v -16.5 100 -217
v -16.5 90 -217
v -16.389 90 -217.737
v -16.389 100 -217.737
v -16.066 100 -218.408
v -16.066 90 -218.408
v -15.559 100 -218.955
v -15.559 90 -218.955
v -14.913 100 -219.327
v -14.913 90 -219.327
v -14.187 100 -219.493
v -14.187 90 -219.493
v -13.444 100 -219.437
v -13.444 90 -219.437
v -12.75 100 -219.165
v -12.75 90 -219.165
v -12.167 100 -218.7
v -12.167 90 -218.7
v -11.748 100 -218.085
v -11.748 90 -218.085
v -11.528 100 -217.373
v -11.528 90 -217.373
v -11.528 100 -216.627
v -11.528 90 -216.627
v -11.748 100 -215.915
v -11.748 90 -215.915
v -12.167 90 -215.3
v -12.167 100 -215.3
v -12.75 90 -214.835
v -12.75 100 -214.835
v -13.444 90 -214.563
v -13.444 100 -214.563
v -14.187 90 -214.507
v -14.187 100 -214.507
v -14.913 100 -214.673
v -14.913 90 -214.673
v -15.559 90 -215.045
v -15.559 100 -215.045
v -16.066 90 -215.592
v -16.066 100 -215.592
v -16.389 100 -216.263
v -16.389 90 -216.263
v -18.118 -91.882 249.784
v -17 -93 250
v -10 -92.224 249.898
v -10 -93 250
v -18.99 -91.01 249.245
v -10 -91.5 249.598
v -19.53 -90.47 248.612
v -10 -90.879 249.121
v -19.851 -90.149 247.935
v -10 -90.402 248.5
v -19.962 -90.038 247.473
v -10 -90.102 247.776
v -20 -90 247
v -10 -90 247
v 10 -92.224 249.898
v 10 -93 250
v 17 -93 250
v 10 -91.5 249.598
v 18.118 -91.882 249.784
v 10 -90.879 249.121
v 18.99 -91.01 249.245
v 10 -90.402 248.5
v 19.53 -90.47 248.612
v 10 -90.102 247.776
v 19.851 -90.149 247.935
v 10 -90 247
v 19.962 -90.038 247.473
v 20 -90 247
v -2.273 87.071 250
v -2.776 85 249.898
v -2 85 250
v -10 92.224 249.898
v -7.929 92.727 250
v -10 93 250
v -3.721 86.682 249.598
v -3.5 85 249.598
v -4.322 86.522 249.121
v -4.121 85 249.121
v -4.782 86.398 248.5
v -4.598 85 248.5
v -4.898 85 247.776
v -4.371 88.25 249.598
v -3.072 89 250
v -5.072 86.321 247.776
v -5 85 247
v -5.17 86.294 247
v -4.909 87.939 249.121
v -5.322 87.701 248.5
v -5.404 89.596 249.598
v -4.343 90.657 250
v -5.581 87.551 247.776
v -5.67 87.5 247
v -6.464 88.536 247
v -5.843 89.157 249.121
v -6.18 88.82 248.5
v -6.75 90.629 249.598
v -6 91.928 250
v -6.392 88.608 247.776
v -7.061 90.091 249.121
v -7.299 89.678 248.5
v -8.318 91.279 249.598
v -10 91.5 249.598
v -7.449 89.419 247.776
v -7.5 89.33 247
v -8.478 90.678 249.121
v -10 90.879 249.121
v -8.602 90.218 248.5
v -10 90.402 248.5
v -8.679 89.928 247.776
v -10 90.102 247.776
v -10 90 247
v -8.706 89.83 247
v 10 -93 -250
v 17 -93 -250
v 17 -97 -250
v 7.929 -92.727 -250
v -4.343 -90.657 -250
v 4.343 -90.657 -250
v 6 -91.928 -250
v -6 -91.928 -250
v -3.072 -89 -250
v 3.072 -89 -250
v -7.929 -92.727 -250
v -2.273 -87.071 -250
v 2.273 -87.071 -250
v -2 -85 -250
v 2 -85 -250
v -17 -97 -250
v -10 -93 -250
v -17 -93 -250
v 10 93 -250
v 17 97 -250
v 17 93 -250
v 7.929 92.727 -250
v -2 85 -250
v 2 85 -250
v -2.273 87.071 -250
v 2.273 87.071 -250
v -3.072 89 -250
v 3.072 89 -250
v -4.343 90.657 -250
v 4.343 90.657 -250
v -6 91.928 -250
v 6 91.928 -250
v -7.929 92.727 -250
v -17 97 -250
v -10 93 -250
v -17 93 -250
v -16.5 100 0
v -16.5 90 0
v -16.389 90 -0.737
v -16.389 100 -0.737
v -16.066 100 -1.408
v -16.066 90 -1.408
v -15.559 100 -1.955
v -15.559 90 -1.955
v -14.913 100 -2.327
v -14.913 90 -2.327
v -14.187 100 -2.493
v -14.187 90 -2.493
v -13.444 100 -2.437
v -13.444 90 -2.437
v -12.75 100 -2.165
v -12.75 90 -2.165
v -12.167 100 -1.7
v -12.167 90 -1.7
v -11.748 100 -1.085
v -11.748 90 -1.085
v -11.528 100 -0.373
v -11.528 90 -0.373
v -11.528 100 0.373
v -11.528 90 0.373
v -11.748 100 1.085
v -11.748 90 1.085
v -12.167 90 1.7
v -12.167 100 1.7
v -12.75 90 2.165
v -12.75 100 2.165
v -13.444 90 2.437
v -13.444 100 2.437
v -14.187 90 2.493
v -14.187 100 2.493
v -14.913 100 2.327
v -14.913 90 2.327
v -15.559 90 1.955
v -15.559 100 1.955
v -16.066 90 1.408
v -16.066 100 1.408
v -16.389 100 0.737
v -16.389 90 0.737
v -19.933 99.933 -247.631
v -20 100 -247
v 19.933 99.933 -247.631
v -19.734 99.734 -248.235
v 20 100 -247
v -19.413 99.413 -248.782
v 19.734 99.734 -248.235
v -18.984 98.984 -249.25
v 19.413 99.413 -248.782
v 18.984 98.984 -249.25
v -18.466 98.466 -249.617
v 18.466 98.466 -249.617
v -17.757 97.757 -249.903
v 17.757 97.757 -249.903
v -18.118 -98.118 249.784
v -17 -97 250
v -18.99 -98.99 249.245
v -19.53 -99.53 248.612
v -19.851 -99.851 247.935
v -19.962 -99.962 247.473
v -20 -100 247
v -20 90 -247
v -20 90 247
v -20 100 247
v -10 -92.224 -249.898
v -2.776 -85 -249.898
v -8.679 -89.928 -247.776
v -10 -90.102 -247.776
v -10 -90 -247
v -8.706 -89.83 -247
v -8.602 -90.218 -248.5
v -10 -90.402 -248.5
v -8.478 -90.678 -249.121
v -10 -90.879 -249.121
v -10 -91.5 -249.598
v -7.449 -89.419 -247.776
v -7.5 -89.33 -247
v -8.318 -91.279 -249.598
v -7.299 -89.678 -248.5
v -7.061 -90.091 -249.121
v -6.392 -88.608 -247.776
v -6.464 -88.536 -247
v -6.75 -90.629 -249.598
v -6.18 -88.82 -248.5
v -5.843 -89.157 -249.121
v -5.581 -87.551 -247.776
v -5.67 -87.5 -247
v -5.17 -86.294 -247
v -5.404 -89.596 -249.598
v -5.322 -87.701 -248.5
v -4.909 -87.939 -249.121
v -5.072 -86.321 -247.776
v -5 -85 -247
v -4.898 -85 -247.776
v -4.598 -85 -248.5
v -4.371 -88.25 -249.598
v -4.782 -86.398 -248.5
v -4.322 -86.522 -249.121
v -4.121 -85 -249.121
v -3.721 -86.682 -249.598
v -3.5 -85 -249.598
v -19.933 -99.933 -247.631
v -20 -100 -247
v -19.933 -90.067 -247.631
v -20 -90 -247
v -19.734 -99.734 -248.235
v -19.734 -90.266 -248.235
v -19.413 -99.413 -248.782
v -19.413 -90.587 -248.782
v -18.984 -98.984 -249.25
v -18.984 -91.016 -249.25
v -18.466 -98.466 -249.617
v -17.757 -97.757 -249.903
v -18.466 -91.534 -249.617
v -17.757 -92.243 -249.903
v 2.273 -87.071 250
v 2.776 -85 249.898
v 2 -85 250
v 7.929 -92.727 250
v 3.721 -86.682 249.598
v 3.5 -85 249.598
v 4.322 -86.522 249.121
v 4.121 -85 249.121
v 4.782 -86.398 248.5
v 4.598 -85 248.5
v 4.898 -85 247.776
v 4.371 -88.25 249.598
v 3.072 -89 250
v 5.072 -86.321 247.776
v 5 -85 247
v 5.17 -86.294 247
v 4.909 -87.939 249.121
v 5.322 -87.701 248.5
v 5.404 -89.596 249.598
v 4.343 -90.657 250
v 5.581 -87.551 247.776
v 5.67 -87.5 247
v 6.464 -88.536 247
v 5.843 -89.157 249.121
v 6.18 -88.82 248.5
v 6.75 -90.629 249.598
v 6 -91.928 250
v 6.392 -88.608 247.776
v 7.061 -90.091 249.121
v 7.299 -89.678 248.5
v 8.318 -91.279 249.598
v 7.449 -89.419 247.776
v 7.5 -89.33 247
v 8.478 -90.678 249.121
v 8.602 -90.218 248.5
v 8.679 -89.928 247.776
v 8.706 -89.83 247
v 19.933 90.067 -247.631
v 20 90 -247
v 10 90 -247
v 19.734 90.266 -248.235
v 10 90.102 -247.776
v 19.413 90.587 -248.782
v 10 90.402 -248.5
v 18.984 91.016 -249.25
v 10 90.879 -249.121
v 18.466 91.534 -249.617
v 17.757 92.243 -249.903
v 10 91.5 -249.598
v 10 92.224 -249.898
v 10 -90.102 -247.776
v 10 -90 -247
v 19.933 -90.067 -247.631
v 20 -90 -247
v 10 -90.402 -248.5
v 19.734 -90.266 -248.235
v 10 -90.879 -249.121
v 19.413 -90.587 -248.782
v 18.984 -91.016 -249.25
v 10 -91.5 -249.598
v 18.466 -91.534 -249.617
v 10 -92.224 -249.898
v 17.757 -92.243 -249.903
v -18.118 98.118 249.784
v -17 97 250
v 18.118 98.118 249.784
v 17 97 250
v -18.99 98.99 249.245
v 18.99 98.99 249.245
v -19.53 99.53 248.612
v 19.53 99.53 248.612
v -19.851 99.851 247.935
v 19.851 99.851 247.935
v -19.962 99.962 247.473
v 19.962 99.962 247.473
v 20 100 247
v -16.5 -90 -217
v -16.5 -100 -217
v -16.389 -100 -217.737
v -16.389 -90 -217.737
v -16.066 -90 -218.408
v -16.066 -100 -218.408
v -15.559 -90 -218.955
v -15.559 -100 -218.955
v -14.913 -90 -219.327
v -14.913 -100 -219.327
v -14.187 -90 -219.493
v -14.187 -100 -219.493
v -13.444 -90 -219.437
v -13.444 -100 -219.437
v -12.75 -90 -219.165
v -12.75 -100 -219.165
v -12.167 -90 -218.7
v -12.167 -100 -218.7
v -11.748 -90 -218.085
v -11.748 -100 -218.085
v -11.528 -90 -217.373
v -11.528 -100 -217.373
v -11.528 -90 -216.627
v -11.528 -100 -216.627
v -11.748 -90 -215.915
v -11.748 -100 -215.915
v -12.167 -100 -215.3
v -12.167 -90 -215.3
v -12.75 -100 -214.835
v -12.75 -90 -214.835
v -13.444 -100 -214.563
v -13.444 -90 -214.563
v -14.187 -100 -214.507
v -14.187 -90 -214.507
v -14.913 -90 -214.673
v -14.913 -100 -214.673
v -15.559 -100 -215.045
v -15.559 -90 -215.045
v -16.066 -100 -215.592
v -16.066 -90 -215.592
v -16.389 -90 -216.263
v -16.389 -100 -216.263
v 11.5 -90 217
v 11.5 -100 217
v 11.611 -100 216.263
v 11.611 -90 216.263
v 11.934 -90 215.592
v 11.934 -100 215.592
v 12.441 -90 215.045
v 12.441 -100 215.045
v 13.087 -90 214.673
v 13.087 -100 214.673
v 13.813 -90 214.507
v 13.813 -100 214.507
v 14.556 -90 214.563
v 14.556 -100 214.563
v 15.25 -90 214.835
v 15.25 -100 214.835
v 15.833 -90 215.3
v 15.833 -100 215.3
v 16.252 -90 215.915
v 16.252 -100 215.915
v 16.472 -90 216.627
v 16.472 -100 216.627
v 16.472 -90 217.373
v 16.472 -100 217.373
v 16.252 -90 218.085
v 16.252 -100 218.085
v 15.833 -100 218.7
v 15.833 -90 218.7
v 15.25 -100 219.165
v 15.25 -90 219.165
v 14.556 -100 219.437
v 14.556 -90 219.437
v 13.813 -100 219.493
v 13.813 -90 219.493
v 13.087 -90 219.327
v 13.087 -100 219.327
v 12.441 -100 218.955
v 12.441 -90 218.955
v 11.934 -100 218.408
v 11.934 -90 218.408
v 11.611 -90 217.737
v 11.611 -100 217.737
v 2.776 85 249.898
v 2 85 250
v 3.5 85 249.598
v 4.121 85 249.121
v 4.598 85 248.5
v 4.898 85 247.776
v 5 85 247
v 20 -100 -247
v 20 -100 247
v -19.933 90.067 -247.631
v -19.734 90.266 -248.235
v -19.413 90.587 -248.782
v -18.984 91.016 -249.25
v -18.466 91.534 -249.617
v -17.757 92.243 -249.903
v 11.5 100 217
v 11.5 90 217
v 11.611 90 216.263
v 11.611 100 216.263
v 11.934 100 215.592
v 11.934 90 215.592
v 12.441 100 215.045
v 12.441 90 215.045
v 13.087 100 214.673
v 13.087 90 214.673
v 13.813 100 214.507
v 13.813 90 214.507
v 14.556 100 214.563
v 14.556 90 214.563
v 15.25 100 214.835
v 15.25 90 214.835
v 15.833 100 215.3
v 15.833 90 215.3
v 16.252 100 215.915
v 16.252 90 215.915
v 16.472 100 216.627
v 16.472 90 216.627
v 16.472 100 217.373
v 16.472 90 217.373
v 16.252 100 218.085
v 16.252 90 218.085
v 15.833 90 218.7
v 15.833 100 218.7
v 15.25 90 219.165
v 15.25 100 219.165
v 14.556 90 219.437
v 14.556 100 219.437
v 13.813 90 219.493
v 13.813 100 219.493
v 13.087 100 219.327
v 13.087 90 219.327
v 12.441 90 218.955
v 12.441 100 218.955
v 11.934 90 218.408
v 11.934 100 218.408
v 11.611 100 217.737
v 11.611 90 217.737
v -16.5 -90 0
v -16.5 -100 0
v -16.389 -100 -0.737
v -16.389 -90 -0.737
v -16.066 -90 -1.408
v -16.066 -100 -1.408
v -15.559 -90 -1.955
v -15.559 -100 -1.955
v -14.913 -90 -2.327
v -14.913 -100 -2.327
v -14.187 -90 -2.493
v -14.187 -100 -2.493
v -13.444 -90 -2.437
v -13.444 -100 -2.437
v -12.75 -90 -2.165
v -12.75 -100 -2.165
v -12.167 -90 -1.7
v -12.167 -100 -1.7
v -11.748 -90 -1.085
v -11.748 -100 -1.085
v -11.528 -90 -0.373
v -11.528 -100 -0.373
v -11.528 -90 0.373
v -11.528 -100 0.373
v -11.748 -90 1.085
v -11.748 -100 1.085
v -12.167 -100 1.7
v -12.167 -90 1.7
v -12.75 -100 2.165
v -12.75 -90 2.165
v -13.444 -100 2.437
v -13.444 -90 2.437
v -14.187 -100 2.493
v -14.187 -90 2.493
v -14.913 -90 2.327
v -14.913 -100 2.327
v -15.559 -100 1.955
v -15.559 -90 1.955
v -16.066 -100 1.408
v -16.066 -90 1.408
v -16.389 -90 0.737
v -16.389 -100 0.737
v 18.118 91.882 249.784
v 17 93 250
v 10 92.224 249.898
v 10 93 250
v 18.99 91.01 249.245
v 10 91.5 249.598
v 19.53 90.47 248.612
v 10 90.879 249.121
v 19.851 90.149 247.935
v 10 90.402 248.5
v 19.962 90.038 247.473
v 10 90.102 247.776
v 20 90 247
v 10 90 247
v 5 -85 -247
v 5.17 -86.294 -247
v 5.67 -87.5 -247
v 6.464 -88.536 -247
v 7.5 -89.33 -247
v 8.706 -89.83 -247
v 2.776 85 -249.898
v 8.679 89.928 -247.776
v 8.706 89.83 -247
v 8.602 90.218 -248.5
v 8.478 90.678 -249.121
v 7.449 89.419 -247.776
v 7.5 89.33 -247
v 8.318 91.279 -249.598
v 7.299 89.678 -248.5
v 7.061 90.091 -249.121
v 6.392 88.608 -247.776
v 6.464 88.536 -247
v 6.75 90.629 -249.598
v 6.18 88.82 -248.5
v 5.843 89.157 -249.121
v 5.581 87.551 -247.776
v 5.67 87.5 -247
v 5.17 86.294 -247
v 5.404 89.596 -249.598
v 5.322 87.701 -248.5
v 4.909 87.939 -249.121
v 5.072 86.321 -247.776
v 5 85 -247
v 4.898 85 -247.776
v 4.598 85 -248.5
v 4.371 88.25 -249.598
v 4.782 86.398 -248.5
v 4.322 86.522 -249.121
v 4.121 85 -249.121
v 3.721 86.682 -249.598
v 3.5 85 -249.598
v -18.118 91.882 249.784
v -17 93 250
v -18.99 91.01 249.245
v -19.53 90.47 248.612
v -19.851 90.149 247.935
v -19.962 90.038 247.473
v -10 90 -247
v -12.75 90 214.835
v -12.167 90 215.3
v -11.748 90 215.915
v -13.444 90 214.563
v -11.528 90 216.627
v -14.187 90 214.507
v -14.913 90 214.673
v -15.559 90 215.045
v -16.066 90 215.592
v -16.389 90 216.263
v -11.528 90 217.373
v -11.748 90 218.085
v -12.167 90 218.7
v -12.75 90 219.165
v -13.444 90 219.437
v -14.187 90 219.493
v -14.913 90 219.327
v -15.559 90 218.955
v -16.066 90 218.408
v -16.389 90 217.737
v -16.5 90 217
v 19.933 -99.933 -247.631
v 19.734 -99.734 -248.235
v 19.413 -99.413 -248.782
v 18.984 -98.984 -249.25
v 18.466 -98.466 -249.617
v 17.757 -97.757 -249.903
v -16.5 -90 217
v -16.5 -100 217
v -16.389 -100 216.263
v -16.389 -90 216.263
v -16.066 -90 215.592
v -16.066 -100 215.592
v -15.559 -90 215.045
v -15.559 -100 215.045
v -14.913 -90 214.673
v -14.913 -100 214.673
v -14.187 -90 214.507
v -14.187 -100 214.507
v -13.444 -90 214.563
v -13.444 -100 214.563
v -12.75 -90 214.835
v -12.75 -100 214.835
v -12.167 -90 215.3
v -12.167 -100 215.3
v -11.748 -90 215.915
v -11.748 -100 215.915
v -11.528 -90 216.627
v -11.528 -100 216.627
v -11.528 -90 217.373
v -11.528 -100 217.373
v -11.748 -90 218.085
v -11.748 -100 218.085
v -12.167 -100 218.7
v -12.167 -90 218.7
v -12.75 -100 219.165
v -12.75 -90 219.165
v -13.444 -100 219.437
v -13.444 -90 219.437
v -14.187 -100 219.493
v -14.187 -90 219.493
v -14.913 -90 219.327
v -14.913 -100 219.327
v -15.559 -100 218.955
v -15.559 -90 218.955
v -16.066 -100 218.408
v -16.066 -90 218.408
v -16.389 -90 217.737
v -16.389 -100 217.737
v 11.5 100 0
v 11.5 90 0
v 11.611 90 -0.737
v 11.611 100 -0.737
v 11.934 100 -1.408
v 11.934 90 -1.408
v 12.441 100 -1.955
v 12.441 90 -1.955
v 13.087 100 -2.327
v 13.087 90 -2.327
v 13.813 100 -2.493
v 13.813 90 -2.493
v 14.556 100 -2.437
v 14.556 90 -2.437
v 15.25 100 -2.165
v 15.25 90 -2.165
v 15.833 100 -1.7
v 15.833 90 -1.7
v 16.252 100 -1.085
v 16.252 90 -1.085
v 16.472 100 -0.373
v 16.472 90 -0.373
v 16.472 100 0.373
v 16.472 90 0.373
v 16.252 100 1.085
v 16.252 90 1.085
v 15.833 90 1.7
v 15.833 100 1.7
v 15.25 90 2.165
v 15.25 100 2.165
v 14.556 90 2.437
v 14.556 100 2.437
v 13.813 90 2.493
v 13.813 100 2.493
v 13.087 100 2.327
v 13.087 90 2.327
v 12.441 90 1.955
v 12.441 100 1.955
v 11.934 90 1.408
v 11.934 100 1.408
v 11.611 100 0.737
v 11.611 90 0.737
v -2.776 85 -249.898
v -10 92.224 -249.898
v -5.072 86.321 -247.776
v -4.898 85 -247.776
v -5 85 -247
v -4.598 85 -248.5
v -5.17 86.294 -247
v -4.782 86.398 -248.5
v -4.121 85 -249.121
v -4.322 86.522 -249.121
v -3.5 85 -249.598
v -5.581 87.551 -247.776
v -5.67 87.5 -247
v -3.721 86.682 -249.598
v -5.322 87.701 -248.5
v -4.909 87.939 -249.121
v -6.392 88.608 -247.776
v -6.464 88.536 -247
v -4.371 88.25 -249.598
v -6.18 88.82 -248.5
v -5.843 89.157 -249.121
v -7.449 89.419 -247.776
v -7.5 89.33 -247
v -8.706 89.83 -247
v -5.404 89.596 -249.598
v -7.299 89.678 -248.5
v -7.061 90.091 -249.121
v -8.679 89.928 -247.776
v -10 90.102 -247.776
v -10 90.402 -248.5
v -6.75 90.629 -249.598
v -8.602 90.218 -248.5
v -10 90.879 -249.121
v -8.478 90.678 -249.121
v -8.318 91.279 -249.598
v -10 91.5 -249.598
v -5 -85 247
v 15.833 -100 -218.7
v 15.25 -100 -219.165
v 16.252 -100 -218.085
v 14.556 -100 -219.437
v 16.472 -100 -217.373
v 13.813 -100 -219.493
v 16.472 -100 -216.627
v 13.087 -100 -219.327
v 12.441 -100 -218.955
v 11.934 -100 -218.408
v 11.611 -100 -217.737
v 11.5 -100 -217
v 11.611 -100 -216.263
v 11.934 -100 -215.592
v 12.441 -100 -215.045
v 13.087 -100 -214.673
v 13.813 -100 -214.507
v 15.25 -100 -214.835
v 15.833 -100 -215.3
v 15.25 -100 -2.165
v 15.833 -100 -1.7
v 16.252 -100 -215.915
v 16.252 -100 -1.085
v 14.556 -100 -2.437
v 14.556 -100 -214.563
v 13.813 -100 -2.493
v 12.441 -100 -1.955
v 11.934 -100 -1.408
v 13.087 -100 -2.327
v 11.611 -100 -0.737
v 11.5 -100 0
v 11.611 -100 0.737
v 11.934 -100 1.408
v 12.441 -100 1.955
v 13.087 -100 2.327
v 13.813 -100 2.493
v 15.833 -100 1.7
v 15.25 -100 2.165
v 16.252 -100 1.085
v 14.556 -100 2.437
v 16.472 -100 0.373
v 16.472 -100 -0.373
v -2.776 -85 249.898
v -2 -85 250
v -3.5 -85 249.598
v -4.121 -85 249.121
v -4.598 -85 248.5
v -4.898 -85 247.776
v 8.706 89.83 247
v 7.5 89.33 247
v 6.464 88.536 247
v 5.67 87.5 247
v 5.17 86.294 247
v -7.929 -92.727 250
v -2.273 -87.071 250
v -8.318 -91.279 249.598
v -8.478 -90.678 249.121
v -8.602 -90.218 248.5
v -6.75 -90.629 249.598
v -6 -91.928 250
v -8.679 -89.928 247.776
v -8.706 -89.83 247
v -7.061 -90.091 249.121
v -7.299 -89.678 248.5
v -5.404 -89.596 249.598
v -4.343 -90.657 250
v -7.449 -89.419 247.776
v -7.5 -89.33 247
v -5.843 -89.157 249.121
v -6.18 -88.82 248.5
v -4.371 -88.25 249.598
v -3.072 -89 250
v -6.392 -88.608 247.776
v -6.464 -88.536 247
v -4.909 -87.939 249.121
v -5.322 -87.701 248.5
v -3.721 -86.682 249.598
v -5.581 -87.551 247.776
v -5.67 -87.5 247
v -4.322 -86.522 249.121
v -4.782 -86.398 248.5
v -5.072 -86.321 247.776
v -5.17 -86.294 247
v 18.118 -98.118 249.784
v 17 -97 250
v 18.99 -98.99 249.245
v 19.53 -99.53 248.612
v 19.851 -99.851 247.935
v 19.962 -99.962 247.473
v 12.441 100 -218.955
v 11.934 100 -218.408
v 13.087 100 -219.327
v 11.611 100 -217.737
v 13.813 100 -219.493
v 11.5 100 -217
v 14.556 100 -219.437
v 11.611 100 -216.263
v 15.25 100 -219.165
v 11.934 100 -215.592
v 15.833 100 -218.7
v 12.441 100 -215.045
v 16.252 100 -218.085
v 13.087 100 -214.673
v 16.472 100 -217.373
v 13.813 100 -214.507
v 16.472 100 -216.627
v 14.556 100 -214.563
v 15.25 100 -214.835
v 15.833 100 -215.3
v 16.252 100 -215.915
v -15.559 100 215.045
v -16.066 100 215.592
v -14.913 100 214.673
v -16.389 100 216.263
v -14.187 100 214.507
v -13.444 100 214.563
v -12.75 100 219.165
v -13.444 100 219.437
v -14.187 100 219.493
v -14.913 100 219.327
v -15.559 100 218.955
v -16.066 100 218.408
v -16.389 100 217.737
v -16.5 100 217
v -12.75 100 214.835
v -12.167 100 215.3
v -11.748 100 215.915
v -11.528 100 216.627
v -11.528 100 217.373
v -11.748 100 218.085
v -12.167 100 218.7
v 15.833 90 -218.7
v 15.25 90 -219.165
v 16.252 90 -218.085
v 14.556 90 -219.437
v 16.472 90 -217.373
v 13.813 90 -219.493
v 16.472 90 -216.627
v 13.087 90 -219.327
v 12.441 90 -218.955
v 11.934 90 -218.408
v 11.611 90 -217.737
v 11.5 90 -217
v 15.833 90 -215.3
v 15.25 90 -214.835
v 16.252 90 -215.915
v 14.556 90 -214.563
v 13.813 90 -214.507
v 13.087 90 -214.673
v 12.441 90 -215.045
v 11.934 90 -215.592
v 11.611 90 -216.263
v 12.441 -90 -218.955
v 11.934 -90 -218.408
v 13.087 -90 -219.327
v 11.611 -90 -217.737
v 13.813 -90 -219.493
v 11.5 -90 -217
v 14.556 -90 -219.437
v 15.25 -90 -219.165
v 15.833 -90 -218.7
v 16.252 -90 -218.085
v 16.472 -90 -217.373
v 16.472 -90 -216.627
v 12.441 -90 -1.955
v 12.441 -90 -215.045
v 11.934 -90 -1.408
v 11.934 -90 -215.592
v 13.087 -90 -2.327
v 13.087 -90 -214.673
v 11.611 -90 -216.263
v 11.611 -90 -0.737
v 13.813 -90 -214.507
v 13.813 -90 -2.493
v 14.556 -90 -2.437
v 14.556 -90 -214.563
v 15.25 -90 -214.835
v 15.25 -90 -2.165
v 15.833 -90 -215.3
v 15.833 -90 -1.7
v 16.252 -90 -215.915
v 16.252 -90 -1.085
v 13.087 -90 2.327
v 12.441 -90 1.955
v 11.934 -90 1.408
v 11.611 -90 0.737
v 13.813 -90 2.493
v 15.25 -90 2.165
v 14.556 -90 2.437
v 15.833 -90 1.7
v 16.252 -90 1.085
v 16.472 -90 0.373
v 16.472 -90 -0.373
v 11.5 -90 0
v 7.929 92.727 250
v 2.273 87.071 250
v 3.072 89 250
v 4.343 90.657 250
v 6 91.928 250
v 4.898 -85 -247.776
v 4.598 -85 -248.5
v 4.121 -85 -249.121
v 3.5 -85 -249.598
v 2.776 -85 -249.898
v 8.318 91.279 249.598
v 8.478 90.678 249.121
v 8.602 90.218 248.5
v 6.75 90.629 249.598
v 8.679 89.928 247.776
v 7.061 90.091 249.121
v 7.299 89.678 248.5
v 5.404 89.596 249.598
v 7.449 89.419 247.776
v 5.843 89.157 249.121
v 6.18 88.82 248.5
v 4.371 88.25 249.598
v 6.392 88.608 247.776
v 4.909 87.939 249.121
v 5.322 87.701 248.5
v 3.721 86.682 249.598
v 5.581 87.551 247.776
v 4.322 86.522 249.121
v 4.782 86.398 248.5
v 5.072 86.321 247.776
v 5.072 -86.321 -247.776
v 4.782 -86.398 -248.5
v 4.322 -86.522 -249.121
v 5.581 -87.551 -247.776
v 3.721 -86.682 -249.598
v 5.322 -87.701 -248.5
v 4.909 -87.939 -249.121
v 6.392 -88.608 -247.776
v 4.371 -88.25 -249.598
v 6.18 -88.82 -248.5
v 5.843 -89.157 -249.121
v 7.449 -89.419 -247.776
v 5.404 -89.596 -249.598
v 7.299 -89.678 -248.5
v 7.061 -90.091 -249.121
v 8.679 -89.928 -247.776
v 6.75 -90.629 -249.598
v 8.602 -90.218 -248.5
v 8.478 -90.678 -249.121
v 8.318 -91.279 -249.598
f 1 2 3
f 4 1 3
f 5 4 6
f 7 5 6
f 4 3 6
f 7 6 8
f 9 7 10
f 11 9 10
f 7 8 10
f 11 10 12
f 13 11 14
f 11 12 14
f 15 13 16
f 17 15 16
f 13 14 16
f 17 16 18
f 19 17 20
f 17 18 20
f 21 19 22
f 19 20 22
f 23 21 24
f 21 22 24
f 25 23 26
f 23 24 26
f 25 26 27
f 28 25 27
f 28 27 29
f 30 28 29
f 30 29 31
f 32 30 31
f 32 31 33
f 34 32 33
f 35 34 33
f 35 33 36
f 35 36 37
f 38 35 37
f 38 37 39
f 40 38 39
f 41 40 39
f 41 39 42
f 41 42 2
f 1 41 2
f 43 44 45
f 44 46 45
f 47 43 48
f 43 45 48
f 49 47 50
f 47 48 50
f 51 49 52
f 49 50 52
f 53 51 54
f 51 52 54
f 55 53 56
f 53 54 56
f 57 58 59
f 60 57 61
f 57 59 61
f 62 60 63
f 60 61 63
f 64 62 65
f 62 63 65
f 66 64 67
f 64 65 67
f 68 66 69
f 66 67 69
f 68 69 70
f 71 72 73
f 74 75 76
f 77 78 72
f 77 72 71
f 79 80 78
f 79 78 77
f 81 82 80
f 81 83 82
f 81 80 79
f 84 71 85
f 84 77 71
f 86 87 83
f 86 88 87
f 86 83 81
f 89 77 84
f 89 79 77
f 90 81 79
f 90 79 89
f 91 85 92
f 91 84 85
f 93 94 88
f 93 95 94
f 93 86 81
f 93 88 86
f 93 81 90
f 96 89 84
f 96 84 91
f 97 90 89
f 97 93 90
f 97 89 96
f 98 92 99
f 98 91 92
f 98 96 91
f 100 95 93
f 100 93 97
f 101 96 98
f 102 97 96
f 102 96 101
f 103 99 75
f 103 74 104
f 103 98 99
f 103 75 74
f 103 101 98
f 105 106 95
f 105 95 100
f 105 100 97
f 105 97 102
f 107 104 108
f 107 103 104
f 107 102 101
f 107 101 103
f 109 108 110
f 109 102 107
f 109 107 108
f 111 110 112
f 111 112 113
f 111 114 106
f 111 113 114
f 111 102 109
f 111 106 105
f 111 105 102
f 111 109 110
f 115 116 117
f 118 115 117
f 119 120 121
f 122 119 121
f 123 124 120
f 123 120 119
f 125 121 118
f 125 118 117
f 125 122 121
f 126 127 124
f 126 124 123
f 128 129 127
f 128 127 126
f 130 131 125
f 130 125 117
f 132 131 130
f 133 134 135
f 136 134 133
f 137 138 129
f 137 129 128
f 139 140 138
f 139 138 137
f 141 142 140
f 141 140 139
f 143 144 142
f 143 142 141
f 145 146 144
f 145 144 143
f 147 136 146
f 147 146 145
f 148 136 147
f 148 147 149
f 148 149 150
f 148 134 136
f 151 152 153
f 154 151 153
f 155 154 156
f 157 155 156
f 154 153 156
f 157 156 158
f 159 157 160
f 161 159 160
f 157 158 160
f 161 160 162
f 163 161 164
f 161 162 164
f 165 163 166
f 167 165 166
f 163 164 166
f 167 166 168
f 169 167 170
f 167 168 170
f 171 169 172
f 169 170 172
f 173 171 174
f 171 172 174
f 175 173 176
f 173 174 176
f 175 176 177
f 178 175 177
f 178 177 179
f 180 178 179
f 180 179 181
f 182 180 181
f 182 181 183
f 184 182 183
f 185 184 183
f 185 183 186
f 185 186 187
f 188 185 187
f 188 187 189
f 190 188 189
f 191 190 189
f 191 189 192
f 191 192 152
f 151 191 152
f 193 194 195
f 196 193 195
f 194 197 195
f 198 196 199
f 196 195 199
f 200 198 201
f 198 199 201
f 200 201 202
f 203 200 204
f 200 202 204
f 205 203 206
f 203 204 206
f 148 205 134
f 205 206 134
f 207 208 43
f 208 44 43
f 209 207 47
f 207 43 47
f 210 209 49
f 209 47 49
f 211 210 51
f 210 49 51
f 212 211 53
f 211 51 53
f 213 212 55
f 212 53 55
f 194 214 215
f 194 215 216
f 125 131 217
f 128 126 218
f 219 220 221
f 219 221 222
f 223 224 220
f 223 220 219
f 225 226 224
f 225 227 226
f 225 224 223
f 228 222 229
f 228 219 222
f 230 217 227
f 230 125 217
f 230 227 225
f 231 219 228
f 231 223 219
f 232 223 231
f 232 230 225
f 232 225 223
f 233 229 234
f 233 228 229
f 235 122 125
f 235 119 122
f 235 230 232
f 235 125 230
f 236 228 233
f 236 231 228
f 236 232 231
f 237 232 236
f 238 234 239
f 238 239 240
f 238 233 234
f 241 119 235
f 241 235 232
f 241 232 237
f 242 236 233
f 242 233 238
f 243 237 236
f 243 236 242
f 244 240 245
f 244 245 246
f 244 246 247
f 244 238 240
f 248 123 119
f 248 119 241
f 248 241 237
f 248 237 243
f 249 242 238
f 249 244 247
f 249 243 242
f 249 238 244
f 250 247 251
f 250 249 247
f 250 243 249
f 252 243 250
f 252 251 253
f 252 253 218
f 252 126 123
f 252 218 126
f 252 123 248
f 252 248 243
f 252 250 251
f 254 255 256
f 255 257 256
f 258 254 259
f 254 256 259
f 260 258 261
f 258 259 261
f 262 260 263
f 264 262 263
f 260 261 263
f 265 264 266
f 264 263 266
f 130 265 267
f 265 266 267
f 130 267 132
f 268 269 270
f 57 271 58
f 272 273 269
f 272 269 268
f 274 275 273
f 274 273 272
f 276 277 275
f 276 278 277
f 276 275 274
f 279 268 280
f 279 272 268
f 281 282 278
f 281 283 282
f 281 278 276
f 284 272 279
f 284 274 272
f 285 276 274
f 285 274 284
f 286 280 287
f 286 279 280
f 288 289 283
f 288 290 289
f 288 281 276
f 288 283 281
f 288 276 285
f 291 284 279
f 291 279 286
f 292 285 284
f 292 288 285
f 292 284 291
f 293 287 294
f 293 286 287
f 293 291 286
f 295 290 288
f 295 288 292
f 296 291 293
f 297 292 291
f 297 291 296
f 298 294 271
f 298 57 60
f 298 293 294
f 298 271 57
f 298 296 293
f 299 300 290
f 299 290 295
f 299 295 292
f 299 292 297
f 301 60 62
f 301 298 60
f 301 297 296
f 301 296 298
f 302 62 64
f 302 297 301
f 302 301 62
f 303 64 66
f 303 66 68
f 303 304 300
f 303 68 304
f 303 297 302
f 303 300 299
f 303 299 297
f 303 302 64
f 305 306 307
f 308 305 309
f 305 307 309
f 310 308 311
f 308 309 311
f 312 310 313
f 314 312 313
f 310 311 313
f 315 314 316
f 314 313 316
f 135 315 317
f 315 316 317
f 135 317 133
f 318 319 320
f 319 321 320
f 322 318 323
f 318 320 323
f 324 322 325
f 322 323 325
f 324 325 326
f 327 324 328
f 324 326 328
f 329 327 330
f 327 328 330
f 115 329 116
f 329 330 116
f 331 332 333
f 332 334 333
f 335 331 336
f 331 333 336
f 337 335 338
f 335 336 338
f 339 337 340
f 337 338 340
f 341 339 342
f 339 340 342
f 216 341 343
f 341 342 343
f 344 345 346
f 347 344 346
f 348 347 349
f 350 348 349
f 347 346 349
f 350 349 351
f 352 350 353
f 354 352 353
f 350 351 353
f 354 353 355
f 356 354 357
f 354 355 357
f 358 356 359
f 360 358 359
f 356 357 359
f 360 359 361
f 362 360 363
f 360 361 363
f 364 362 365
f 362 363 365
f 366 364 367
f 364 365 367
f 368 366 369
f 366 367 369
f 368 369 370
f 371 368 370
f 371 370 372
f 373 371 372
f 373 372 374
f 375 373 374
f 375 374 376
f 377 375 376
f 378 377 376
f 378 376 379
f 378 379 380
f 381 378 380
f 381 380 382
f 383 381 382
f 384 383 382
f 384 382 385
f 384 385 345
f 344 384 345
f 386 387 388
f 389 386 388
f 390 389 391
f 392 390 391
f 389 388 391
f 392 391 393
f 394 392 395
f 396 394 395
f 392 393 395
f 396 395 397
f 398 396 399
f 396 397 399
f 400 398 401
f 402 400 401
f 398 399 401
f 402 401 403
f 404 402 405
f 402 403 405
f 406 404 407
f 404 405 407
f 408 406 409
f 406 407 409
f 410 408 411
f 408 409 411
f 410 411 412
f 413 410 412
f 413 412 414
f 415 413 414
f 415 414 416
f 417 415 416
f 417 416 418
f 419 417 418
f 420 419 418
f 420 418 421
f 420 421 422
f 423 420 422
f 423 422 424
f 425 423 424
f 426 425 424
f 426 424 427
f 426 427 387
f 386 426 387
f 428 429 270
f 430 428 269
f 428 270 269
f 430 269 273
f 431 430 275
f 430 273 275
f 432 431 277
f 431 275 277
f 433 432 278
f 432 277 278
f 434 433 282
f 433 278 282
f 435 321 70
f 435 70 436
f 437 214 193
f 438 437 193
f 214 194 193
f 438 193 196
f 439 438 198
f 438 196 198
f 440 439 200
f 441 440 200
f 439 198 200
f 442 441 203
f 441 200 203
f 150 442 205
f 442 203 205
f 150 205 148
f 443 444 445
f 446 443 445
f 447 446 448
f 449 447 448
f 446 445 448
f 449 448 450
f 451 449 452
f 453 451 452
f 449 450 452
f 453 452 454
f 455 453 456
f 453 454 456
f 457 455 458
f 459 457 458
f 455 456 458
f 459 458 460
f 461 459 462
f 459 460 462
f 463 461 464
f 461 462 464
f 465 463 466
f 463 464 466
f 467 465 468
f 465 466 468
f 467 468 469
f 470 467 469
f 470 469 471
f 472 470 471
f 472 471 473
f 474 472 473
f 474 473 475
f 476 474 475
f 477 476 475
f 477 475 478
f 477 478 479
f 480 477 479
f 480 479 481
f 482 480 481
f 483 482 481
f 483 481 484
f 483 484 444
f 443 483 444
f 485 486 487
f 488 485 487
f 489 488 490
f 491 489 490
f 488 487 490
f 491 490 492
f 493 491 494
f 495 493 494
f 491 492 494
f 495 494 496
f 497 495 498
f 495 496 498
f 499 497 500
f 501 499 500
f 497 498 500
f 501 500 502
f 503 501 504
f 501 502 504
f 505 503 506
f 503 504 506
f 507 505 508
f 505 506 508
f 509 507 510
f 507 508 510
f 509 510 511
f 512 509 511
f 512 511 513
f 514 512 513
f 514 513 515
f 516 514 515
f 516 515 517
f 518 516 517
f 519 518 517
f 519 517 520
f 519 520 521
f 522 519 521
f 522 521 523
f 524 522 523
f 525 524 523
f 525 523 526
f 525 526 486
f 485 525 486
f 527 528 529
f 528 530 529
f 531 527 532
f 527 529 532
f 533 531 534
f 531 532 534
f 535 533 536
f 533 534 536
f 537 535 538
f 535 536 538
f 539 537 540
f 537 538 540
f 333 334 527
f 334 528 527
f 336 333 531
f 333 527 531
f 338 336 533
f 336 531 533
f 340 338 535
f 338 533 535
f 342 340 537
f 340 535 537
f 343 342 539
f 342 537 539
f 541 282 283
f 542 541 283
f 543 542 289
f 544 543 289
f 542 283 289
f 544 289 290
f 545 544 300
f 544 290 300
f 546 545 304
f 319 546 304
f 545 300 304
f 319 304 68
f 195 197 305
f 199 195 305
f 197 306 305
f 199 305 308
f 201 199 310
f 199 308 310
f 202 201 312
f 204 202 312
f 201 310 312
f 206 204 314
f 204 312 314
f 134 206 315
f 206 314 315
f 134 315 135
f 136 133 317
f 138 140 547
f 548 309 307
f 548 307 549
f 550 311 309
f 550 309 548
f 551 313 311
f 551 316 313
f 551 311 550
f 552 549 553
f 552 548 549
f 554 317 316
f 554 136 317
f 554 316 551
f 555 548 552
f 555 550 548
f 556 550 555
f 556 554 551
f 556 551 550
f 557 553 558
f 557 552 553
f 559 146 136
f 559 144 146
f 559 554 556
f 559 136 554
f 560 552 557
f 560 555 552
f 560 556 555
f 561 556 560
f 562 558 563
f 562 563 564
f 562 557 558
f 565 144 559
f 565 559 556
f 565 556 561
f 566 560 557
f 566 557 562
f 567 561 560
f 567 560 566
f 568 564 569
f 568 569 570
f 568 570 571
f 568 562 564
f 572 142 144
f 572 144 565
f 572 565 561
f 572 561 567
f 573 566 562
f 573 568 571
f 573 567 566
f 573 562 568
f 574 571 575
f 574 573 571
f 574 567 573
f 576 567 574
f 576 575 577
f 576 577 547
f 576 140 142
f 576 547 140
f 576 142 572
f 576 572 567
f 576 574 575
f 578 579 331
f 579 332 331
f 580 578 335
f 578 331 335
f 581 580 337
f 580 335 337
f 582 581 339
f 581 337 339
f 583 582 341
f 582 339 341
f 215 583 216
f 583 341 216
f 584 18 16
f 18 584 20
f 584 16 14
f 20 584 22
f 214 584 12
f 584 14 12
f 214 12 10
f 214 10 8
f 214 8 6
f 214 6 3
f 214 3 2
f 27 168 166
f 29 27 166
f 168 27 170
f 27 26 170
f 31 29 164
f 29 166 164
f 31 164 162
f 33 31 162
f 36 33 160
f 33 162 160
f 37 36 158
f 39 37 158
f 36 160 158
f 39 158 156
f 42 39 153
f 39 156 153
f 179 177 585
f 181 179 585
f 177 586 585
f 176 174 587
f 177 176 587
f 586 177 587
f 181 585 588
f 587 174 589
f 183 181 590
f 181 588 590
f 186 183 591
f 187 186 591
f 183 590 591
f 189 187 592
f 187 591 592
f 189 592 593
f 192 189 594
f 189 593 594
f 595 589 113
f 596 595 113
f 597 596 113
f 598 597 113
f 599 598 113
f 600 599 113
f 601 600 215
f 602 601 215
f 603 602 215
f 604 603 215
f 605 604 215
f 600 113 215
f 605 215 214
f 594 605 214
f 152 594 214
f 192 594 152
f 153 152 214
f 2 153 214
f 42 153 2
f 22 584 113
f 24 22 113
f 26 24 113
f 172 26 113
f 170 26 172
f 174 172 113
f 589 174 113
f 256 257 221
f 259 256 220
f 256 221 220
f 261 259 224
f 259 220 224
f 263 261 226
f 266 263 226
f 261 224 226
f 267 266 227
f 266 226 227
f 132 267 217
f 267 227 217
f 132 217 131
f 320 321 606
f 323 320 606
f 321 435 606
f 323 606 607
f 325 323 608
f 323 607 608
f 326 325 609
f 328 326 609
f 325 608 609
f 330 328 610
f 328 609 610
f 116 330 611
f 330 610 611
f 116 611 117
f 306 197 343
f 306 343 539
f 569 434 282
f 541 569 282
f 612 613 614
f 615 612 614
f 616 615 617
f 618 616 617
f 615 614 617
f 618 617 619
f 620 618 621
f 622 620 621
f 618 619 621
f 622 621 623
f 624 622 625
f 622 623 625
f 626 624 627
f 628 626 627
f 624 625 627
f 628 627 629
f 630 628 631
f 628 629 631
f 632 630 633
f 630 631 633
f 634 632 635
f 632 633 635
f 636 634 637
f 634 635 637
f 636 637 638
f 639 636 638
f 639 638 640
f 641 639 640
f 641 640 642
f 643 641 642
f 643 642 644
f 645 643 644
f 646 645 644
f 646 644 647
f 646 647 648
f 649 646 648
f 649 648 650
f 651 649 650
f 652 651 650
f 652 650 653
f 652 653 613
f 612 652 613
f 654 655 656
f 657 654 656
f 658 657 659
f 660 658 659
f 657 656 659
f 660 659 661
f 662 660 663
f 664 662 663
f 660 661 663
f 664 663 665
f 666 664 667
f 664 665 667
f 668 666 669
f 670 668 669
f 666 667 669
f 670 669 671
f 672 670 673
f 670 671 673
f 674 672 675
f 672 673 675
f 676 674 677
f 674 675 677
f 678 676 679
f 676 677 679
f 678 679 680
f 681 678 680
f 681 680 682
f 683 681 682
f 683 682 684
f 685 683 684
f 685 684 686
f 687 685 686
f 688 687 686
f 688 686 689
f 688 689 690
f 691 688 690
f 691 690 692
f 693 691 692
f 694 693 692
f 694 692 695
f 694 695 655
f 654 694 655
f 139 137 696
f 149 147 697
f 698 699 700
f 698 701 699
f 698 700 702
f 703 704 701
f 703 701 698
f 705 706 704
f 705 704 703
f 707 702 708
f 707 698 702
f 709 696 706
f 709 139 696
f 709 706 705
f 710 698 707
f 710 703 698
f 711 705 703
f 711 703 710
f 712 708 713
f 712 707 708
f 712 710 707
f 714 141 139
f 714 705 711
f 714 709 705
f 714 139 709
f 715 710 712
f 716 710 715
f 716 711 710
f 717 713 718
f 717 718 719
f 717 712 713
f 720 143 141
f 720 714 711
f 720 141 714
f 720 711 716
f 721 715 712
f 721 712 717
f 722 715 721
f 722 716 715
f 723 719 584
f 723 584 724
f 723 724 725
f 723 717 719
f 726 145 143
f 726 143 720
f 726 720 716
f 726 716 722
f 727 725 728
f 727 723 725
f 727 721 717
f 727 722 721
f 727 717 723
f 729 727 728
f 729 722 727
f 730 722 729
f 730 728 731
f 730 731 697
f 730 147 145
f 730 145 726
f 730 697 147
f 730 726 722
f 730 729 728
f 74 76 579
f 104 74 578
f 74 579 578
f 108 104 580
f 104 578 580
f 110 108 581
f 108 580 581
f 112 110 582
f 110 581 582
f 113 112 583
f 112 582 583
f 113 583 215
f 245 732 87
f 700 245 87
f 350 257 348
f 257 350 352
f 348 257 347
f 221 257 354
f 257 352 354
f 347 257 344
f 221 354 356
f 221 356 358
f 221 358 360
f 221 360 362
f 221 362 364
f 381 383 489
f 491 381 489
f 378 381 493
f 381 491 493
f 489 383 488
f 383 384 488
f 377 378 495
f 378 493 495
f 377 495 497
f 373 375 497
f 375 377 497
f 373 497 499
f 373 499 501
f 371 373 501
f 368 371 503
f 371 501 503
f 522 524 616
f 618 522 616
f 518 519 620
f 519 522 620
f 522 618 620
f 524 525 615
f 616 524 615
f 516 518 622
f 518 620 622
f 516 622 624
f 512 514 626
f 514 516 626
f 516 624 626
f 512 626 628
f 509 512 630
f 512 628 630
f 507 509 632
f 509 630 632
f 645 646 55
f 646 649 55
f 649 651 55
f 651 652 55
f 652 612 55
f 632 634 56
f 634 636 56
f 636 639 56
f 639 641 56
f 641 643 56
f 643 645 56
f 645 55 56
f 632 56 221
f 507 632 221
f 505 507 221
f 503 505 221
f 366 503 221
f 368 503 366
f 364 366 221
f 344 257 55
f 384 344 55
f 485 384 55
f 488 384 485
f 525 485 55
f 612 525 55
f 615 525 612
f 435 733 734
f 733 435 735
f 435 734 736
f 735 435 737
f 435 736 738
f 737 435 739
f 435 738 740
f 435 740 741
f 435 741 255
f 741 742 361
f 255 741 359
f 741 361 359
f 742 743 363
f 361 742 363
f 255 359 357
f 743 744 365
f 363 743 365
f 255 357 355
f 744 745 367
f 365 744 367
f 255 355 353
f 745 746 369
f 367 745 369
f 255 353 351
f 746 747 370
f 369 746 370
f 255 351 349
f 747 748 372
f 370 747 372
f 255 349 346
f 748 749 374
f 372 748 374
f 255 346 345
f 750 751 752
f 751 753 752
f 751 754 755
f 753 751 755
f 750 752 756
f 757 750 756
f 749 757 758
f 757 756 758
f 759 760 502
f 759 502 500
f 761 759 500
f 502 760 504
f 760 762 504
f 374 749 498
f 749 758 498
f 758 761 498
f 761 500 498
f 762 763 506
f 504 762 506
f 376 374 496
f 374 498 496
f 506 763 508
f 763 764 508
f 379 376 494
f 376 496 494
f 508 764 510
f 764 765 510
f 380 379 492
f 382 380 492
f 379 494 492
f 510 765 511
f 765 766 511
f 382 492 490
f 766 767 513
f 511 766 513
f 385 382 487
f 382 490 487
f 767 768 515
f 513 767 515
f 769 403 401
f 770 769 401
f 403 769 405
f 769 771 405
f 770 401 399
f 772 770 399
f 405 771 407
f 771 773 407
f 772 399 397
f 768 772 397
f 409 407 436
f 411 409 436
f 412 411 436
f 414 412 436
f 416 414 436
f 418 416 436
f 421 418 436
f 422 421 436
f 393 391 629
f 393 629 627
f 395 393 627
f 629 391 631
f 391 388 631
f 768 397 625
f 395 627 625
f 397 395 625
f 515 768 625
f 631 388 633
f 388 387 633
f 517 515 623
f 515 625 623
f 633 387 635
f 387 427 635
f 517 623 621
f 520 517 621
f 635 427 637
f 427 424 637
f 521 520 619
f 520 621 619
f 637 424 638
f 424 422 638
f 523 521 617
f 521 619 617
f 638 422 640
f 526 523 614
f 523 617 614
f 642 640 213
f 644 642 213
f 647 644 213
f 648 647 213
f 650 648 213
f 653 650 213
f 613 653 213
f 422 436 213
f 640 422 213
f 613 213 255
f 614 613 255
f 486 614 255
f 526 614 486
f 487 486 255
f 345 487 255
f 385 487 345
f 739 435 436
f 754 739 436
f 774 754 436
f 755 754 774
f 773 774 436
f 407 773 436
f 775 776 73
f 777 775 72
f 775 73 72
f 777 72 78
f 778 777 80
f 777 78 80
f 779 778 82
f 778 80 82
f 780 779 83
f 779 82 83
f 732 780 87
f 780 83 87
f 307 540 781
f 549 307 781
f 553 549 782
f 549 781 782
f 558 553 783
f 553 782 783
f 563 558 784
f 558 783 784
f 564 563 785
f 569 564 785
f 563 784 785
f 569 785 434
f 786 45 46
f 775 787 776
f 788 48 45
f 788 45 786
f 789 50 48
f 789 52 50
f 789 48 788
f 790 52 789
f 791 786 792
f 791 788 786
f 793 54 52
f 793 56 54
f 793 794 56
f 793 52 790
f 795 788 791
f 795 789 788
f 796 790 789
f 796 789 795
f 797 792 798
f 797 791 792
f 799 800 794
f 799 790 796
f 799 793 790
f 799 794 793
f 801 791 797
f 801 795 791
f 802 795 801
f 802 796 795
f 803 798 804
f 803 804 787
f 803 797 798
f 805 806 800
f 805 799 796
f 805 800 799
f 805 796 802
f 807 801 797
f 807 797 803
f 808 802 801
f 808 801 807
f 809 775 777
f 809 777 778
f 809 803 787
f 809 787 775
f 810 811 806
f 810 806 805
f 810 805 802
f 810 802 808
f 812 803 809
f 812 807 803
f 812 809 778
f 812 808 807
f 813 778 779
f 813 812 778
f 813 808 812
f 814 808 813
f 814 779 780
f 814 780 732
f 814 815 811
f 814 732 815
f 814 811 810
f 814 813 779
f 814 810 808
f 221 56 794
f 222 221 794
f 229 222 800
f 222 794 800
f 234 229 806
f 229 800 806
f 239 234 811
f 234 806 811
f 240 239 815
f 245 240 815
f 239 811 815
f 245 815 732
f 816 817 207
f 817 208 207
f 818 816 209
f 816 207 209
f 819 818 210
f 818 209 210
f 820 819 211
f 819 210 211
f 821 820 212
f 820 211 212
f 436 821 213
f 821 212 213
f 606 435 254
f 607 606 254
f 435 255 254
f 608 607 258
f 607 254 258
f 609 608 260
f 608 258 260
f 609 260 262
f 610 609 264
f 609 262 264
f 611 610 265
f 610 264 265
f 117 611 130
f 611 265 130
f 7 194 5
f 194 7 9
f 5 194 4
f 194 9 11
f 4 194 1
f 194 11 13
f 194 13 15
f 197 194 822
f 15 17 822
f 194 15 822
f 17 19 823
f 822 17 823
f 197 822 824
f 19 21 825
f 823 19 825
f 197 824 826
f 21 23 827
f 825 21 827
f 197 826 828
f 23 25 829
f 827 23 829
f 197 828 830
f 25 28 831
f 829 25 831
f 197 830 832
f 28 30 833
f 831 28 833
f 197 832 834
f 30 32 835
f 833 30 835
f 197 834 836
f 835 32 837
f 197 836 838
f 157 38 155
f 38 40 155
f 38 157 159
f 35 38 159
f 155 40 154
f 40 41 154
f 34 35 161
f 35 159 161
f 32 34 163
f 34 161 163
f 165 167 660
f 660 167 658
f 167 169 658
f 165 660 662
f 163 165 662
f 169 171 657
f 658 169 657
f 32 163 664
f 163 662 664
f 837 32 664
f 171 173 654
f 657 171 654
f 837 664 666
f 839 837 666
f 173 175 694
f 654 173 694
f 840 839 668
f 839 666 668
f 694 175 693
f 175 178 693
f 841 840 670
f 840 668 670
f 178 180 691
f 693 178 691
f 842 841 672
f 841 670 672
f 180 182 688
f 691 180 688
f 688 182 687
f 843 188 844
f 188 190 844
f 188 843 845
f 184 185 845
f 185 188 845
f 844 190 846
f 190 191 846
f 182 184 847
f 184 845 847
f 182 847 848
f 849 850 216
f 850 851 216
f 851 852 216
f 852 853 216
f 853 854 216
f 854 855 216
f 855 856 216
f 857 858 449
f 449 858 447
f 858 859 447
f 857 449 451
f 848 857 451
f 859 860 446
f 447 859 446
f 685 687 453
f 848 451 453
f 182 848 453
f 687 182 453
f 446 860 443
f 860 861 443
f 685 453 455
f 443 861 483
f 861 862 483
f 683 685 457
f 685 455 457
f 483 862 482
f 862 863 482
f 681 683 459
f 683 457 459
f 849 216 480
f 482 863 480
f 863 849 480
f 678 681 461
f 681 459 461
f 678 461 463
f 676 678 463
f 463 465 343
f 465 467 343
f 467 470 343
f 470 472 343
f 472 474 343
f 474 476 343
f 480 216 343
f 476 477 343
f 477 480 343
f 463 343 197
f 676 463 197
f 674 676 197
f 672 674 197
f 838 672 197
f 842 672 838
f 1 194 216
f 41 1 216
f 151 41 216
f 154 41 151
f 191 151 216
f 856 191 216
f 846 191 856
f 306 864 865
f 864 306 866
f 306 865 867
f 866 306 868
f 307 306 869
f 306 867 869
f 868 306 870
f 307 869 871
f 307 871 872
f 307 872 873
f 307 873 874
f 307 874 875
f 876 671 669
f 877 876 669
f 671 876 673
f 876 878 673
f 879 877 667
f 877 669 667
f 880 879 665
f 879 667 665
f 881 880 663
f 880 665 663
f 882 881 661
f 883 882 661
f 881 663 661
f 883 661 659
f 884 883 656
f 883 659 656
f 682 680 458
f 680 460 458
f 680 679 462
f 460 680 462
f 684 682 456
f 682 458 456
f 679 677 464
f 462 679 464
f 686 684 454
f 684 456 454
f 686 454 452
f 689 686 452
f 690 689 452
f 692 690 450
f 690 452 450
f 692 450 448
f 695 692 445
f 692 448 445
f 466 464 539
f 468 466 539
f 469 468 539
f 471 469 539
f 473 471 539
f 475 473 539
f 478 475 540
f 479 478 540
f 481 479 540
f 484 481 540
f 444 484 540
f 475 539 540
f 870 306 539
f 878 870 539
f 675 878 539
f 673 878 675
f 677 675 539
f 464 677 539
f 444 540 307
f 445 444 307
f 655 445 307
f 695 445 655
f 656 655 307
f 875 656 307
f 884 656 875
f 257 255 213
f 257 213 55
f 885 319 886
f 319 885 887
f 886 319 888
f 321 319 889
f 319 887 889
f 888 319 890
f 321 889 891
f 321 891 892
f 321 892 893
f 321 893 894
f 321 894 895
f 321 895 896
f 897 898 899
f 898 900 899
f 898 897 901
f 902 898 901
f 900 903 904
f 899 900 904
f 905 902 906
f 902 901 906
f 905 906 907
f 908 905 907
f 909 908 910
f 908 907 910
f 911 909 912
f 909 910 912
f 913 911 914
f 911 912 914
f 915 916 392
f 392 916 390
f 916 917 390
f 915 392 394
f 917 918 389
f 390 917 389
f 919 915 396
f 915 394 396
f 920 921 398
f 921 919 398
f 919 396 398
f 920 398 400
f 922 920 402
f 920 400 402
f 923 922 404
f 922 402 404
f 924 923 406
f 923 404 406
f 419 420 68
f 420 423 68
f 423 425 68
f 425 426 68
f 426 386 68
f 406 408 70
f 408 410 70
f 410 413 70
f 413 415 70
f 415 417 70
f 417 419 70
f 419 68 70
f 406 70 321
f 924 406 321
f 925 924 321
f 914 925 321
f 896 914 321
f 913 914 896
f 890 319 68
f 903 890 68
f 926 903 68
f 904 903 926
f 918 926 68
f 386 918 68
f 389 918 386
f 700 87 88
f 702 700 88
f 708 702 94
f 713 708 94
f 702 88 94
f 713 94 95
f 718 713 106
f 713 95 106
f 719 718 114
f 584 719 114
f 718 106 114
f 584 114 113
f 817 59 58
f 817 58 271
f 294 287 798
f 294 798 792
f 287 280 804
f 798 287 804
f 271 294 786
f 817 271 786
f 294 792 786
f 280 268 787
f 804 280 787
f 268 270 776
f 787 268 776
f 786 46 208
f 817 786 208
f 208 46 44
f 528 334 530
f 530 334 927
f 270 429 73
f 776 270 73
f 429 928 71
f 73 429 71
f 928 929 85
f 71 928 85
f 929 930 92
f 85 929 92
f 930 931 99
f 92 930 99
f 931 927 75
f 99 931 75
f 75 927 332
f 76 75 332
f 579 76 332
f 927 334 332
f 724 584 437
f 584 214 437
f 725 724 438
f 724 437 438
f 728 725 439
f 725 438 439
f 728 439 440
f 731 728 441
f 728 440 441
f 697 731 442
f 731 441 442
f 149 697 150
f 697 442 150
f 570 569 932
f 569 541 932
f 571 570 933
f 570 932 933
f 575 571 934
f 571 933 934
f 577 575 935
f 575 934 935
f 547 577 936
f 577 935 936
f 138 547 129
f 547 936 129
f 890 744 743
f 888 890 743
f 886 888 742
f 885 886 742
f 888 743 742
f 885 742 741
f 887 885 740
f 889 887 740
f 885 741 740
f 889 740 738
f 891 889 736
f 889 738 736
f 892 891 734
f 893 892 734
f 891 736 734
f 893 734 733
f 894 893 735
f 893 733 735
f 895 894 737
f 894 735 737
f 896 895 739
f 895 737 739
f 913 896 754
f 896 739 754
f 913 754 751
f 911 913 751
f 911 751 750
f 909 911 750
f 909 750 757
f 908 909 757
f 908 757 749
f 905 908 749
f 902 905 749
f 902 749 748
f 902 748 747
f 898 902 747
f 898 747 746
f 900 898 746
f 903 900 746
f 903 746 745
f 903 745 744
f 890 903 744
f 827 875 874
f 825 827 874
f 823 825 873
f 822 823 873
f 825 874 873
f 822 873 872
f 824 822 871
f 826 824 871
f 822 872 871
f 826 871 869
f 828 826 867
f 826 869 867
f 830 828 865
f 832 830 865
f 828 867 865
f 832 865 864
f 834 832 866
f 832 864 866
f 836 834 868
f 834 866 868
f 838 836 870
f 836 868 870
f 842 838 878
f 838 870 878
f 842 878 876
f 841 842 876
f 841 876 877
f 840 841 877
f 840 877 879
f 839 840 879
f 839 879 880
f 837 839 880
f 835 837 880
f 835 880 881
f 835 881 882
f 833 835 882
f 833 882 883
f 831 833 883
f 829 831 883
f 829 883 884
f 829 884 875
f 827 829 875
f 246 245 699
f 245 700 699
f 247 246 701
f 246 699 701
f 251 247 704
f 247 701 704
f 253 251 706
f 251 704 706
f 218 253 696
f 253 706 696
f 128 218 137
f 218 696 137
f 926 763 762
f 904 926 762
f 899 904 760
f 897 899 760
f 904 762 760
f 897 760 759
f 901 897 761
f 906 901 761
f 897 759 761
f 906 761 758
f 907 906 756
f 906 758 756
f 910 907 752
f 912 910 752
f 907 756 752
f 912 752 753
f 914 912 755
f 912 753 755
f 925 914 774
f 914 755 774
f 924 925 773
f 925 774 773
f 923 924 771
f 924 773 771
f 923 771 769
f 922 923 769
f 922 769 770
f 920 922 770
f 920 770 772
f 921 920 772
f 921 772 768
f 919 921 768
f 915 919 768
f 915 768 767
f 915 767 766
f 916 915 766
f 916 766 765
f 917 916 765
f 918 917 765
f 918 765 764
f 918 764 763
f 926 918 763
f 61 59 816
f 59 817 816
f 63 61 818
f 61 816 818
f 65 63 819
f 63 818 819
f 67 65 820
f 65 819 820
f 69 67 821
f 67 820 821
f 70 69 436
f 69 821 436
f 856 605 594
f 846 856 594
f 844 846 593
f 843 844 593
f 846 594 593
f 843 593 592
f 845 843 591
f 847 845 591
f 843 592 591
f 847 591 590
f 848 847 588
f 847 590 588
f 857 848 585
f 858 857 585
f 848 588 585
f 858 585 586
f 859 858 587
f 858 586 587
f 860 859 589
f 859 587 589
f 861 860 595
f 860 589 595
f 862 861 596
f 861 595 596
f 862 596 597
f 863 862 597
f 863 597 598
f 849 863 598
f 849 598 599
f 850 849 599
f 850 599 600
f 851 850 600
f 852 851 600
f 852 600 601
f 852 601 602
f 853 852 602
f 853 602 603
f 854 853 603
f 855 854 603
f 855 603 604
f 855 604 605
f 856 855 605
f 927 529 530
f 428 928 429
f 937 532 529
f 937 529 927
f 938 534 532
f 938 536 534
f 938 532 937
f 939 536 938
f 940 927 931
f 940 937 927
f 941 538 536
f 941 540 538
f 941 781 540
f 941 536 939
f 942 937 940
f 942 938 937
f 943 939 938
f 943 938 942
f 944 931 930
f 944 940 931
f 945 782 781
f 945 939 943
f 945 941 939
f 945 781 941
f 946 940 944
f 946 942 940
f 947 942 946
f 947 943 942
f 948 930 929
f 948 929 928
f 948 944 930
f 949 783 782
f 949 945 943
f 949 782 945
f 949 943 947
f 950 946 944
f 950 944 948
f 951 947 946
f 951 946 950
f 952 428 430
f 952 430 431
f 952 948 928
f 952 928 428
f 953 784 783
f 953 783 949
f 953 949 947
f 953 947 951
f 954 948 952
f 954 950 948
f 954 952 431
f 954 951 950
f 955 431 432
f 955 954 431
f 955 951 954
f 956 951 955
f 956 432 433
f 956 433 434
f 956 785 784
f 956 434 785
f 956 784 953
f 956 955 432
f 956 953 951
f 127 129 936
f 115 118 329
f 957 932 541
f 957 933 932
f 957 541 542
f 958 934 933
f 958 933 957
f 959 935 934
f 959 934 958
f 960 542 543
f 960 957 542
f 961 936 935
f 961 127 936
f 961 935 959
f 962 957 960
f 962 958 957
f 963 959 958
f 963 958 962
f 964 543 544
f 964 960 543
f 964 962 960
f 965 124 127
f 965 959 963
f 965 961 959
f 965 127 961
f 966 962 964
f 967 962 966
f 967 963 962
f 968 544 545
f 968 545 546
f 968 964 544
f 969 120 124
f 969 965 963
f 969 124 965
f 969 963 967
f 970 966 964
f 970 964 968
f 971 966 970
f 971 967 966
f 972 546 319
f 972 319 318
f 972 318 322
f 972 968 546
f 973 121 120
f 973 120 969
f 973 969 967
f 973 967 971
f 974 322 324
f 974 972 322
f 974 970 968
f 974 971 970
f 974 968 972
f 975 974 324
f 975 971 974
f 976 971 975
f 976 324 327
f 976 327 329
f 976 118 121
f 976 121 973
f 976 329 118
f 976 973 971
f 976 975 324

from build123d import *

# Parameters (mm, degrees)
BOSS_EXTRUDE1_DEPTH   = 250
FILLET1_R             = 3
F_5_0MM_DOWEL_HOLE1_D = 5


with BuildPart() as part:
    # Sketch2 → Boss-Extrude1 (new, symmetric)
    with BuildSketch(Plane.XY):
        with BuildLine():
            Line((5, 85), (5, -85))
            ThreePointArc((5, -85), (6.464466094, -88.535533906), (10, -90))
            Line((10, -90), (20, -90))
            Line((20, -90), (20, -100))
            Line((20, -100), (-20, -100))
            Line((-20, -100), (-20, -90))
            Line((-20, -90), (-10, -90))
            ThreePointArc((-10, -90), (-6.464466094, -88.535533906), (-5, -85))
            Line((-5, -85), (-5, 85))
            ThreePointArc((-5, 85), (-6.464466094, 88.535533906), (-10, 90))
            Line((-10, 90), (-20, 90))
            Line((-20, 90), (-20, 100))
            Line((-20, 100), (20, 100))
            Line((20, 100), (20, 90))
            Line((20, 90), (10, 90))
            ThreePointArc((10, 90), (6.464466094, 88.535533906), (5, 85))
        make_face()
    extrude(amount=BOSS_EXTRUDE1_DEPTH, both=True)

    # Fillet1
    fillet1_edges = [part.edges().sort_by_distance(p)[0] for p in [
        (-5, 0, 250),
        (-6.464466094, -88.535533906, 250),
        (-15, 90, -250),
        (-20, 95, -250),
        (0, 100, -250),
        (20, 95, -250),
        (15, 90, -250),
        (6.464466094, 88.535533906, -250),
        (-15, -90, 250),
        (5, 0, -250),
        (6.464466094, -88.535533906, -250),
        (15, -90, -250),
        (20, -95, -250),
        (0, -100, -250),
        (-20, -95, -250),
        (-15, -90, -250),
        (-6.464466094, -88.535533906, -250),
        (-5, 0, -250),
        (-6.464466094, 88.535533906, -250),
        (-20, -95, 250),
        (0, -100, 250),
        (20, -95, 250),
        (15, -90, 250),
        (6.464466094, -88.535533906, 250),
        (5, 0, 250),
        (6.464466094, 88.535533906, 250),
        (-6.464466094, 88.535533906, 250),
        (15, 90, 250),
        (20, 95, 250),
        (0, 100, 250),
        (-20, 95, 250),
        (-15, 90, 250),
    ]]
    fillet(fillet1_edges, radius=FILLET1_R)

    # Ø5.0mm Dowel Hole1 (through all)
    with Locations(Plane(origin=(0, 100, 0), x_dir=(1, 0, 0), z_dir=(0, 1, 0))):
        with Locations((14, 217), (-14, 217), (-14, -217), (14, -217), (-14, 0), (14, 0)):
            Hole(F_5_0MM_DOWEL_HOLE1_D / 2)


solid = part.part
